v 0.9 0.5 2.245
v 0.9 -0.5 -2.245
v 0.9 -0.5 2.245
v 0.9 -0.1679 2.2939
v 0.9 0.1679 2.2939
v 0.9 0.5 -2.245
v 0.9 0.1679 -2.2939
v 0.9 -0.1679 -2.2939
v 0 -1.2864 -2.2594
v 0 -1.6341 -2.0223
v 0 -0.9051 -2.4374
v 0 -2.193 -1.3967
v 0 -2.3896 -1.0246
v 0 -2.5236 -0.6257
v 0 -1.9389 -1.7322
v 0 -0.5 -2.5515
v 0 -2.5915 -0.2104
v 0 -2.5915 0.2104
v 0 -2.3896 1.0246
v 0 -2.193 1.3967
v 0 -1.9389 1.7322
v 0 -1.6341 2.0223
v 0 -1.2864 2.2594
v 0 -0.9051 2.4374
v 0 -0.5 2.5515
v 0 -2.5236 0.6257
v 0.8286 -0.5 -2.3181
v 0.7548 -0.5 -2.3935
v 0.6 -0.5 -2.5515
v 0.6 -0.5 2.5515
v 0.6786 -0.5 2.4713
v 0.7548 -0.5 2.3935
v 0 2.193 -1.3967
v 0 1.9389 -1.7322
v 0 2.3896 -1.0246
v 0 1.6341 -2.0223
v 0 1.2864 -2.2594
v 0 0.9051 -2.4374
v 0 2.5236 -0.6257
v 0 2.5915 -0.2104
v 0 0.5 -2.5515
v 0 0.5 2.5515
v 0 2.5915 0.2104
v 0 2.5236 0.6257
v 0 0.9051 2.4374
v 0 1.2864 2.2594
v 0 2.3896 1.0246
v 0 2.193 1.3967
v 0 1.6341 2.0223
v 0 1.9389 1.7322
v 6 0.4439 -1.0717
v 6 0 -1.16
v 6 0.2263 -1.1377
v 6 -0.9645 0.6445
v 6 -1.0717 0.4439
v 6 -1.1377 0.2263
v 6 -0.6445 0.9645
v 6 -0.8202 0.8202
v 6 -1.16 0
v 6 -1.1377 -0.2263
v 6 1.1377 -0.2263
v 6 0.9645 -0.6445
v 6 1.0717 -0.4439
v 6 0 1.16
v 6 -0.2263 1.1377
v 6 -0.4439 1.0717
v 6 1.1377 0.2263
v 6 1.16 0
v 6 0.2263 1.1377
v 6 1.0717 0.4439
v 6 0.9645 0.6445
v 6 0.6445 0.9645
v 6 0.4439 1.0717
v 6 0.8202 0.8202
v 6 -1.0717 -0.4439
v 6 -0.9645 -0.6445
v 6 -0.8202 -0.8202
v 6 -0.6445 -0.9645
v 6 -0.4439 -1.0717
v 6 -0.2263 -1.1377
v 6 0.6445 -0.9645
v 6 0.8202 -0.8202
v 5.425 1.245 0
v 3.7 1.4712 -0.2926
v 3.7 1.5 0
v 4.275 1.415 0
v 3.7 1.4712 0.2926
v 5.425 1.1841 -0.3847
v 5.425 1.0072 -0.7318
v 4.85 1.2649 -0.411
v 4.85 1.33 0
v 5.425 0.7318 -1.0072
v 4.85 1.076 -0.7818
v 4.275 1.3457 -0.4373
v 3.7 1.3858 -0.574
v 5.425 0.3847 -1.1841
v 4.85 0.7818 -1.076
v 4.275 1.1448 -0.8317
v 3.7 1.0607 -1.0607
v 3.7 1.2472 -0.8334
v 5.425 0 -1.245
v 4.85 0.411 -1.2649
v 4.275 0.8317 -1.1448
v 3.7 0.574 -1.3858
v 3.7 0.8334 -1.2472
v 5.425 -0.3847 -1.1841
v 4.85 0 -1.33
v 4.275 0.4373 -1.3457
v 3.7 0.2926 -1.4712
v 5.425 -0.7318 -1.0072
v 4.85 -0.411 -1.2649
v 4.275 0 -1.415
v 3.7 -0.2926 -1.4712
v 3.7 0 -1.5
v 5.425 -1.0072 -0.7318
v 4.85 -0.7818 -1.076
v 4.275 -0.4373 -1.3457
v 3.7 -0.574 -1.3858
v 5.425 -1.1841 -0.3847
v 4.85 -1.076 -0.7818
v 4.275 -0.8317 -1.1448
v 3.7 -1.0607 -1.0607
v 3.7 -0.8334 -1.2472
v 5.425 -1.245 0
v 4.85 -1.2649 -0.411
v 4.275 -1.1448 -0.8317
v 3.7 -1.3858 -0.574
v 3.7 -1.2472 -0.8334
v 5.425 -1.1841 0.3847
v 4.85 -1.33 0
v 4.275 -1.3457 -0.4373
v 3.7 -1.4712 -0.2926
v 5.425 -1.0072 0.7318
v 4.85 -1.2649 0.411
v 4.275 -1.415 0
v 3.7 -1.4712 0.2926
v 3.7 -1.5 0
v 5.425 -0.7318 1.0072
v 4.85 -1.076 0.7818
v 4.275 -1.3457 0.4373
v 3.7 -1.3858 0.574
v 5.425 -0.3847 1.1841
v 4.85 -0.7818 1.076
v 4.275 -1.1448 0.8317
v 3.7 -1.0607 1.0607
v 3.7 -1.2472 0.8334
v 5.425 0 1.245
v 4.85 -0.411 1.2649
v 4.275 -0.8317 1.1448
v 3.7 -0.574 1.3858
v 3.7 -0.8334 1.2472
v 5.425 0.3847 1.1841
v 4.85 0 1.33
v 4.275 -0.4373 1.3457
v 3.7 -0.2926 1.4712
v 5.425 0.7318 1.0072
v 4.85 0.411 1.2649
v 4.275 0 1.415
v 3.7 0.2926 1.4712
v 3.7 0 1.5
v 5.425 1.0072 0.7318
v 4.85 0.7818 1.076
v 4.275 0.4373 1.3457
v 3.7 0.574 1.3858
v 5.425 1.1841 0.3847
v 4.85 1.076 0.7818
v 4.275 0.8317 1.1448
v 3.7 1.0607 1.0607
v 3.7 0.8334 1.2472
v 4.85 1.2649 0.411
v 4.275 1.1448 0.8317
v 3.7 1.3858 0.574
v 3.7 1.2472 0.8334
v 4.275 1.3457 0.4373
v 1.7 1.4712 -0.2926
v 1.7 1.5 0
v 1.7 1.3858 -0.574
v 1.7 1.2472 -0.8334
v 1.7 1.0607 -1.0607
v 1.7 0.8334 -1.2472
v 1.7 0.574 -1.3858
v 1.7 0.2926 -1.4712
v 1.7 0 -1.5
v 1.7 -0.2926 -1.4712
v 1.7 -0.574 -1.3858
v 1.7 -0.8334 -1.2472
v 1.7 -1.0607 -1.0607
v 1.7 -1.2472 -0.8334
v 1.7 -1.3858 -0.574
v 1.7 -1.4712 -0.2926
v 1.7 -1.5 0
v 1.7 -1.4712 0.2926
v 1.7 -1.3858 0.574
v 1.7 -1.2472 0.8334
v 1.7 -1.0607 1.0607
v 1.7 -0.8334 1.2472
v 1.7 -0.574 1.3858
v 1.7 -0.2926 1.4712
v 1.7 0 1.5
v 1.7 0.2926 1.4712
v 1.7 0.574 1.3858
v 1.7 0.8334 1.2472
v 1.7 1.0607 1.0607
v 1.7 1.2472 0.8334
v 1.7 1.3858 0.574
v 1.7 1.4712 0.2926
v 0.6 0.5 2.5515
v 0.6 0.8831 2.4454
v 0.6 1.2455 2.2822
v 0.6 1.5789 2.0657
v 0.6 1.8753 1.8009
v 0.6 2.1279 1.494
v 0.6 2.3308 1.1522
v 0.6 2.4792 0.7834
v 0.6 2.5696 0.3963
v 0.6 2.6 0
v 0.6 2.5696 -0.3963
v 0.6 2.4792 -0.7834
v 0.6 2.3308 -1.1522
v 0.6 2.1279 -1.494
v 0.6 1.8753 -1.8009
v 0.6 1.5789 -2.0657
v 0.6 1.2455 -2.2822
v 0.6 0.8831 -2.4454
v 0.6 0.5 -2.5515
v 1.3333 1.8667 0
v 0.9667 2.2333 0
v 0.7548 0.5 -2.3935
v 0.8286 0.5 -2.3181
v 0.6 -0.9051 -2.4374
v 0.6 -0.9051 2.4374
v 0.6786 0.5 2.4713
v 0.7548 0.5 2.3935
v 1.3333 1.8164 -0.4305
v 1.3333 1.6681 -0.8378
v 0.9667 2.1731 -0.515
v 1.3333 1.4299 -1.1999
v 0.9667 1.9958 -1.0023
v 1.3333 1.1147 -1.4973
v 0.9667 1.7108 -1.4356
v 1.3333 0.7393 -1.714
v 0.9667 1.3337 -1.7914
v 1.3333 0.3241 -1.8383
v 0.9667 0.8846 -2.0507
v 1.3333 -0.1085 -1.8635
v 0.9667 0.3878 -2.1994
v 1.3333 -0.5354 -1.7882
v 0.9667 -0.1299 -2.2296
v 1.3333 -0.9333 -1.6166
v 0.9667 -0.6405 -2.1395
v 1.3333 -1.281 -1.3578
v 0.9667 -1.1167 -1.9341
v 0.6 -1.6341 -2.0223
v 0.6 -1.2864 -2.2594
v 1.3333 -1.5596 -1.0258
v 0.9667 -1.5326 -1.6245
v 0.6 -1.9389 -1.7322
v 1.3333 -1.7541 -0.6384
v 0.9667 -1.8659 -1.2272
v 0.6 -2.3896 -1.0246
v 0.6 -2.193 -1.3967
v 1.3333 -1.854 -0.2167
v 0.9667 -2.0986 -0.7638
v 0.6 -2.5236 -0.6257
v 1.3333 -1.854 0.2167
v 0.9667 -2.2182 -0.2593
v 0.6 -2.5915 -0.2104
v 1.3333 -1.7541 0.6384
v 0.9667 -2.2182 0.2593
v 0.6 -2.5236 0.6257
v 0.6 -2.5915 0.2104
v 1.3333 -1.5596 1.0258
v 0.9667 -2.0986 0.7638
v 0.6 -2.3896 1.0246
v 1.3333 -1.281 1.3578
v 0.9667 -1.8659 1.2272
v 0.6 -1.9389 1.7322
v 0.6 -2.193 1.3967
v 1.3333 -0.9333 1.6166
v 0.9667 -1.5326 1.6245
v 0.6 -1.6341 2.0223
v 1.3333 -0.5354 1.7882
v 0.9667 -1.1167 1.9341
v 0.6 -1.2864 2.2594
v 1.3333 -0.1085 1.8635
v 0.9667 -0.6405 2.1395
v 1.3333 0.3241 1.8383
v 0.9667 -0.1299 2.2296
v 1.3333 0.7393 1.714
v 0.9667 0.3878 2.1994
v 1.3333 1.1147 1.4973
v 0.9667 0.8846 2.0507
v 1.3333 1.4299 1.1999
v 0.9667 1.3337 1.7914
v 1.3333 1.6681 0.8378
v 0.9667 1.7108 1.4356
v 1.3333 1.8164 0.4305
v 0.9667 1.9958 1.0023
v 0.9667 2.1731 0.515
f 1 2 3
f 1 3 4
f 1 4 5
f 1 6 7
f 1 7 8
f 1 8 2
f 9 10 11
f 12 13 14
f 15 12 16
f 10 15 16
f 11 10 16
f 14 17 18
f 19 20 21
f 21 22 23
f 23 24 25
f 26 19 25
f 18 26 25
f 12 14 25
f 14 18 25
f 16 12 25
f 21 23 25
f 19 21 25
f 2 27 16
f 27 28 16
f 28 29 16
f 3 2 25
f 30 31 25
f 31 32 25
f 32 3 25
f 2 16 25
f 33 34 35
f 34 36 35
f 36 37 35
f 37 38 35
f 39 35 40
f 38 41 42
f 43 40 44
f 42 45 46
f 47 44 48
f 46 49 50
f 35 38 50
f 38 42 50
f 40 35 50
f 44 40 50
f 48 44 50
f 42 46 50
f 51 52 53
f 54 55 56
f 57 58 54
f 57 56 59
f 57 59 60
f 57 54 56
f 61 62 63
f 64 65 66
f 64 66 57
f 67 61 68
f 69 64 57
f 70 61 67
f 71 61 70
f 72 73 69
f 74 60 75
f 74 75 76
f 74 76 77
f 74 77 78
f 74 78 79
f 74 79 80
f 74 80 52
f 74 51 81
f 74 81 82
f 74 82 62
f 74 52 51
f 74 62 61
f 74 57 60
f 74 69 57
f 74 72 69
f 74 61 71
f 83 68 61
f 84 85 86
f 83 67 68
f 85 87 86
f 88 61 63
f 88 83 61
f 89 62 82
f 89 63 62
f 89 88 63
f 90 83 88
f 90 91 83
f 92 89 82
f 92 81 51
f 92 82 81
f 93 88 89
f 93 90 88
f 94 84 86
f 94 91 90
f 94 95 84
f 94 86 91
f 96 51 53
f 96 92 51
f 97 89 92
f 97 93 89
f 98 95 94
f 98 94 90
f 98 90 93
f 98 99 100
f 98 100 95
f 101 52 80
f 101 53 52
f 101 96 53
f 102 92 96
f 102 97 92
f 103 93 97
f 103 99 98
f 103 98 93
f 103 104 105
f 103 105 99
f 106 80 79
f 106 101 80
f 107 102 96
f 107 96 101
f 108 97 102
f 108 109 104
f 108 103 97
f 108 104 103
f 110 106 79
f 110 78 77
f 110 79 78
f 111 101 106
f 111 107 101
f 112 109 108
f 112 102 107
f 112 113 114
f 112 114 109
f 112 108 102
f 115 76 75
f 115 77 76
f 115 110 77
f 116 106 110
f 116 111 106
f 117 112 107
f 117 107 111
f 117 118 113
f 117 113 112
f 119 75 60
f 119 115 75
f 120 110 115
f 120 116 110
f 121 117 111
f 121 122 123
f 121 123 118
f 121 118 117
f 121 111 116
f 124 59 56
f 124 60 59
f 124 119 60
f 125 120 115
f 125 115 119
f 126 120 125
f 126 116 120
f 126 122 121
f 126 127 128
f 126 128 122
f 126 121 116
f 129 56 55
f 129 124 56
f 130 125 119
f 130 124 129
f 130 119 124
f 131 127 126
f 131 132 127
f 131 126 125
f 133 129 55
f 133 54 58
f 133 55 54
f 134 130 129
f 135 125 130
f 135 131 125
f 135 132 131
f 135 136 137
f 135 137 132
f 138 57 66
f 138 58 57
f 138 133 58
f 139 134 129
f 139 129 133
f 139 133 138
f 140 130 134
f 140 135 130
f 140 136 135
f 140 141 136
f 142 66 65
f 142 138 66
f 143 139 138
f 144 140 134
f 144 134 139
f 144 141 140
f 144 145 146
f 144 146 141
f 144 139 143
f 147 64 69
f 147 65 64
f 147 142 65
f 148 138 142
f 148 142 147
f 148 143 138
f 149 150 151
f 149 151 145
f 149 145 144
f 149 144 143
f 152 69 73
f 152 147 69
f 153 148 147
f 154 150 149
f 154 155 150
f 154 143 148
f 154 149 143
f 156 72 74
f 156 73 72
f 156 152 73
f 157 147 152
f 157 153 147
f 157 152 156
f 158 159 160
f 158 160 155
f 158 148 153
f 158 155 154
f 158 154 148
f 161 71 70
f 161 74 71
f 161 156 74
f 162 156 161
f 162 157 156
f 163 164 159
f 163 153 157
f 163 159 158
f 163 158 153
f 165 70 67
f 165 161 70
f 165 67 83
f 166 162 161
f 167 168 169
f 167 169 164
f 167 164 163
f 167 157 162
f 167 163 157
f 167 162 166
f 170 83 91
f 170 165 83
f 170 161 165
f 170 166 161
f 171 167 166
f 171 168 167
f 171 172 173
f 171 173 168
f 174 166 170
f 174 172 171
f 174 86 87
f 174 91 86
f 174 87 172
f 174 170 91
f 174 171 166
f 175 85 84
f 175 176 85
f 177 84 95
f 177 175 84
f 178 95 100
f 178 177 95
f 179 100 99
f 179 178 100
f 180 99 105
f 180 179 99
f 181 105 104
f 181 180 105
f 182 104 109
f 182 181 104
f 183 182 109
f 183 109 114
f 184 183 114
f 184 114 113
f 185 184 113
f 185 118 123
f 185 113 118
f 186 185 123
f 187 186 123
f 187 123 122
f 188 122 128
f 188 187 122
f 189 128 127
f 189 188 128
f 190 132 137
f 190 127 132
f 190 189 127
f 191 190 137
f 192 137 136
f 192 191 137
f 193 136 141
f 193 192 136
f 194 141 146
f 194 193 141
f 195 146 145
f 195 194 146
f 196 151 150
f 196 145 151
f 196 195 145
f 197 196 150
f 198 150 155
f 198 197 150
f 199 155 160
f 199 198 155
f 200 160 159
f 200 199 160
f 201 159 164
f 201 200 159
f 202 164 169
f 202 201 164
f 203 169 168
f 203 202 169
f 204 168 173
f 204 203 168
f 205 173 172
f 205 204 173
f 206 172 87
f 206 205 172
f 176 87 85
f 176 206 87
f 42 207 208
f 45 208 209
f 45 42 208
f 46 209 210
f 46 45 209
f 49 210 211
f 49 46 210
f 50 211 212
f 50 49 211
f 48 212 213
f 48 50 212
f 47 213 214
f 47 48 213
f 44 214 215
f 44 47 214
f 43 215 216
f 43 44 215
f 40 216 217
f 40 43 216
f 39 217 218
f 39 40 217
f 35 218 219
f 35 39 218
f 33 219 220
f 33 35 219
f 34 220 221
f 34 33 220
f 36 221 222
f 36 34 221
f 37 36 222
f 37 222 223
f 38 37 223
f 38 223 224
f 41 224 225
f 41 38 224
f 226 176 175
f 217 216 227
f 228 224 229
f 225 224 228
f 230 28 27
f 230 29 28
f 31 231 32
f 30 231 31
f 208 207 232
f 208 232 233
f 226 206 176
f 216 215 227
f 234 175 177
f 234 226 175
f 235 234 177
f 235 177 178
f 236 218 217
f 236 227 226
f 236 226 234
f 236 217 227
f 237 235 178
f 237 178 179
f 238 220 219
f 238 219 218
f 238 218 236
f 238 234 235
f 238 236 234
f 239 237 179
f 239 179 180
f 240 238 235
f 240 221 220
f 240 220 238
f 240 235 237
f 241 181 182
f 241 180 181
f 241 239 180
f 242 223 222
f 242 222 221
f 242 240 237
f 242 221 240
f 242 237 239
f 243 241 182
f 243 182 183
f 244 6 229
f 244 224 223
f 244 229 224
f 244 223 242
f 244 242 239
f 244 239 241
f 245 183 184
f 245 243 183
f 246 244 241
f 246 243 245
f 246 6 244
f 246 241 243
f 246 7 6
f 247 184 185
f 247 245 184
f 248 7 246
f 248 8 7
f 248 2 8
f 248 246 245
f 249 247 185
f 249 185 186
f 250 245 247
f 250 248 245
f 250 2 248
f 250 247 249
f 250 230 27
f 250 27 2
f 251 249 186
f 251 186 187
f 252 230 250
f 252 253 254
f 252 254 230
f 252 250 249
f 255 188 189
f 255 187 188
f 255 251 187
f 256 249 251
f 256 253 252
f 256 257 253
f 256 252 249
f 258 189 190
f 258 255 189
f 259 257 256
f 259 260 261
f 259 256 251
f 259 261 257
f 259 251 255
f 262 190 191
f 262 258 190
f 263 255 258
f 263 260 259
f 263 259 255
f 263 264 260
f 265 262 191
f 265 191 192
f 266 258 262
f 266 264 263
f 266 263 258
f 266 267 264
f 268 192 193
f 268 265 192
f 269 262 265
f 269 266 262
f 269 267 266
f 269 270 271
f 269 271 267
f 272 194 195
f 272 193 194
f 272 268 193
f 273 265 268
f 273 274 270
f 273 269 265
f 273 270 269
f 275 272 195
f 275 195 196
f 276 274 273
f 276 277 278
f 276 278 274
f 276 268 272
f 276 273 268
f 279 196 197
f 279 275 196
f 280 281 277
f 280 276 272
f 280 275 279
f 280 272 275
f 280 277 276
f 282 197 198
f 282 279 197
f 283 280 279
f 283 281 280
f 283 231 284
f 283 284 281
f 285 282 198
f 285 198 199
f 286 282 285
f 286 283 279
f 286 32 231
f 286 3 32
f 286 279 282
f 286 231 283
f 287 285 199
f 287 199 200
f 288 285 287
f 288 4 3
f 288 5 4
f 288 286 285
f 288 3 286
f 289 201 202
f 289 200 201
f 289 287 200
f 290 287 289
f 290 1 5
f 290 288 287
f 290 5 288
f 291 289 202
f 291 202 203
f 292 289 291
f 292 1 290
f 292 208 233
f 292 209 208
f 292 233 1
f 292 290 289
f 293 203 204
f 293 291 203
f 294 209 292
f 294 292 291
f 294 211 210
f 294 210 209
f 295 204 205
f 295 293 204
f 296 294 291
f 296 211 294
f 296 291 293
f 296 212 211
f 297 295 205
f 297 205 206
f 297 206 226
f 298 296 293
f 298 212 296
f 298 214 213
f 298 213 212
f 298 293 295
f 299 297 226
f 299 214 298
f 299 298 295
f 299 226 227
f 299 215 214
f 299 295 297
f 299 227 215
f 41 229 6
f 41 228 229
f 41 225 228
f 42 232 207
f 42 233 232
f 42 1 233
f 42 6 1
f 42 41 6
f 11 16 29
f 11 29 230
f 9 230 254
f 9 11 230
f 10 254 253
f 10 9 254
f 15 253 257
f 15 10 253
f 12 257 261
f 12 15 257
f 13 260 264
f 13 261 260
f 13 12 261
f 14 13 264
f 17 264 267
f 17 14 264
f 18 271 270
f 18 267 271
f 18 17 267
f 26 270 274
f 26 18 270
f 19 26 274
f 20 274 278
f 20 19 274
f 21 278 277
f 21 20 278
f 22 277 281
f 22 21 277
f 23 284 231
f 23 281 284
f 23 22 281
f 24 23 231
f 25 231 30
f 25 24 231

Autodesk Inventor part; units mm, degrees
ref_plane "YZ Plane" through (0, 0, 0) normal (1, 0, 0) x (0, 1, 0)
ref_plane "XZ Plane" through (0, 0, 0) normal (0, 1, 0) x (-1, 0, 0)
sketch "Sketch1" plane through (0, 0, 0) normal (0, 0, 1) x (1, 0, 0)
  line L0 (-1.2, 0) -> (7.2, 0) projected
  line L1 (0, 0) -> (6, 0)
  line L2 (6, 0) -> (6, 1.5)
  line L3 (6, 1.5) -> (1.7, 1.5)
  line L4 (1.7, 1.5) -> (1.7, 1.5)
  line L5 (1.7, 1.5) -> (0.6, 2.6)
  line L6 (0.6, 2.6) -> (0, 2.6)
  line L7 (0, 2.6) -> (0, 0)
  line L8 (0, -0.52) -> (0, 3.12) projected
  dimension "d0" = 6
  dimension "d1" = 1.7
  dimension "d2" = 3
  dimension "d3" = 3
  dimension "d4" = 5.2
  dimension "d5" = 45
revolve "Body" add sketch "Sketch1" angle 360 about axis through (0, 0, 0) along (1, 0, 0)
sketch "Sketch2" plane through (0, 0, 0) normal (-1, 0, 0) x (0, 0, 1)
  circle A0 centre (0, 0) radius 2.6 projected
  line L0 (-3.64, 0) -> (3.64, 0) projected
  line L1 (-2.6, 0) -> (-2.6, 0.5)
  line L2 (-2.6, 0.5) -> (2.6, 0.5)
  line L3 (2.6, 0) -> (2.6, 0.5)
  line L4 (-2.6, 0) -> (-2.6, -0.5)
  line L5 (-2.6, -0.5) -> (2.6, -0.5)
  line L6 (2.6, 0) -> (2.6, -0.5)
  dimension "d8" = 1
extrude "Slot" cut sketch "Sketch2" against normal blind 0.9 contours L0 A0 L2 | L6 L5 A0 | A0 L5 L0 | A0 L2 L3 | L1 L2 A0 | A0 L5 L4
thread "Thread" size "M3x0.5" class "6g" standard "ISO Metric profile" length 4.3
chamfer "Chamfer1" distance 0.34 distance2 2.3 1 edges at (6, -1.5, 0) measured on face at (6, -0.8773, -0.3972)
ref_plane "Work Plane1" through (2.2553, 0, 0) normal (0, 0, -1) x (1, 0, 0)
equation "\"d8\" = SBR"
equation "\"d9\" = STI"
equation "\"d0\" = NLG"
equation "\"d1\" = KOH"
equation "\"d2\" = NND"
equation "\"d3\" = SED2"
equation "\"d4\" = KOD"
equation "\"d5\" = 0.5 * SEWI"
equation "\"d6\" = GEL"
equation "\"d14\" = -0.5 * GD2 + 0.5 * NND"
equation "\"d15\" = SPTZ"
equation "\"NND\" = 3"
equation "\"NLG\" = 6"
equation "\"GEL\" = 4.3"
equation "\"KOH\" = 1.7"
equation "\"KOD\" = 5.2"
equation "\"SBR\" = 1"
equation "\"STI\" = 0.9"
equation "\"GD2\" = 2.32"
equation "\"SED2\" = 3"
equation "\"SEWI\" = 90deg"
equation "\"SPTZ\" = 2.3"
equation "\"GUL\" = 0.61345 * PTC"
equation "\"THREADDIA\" = 3"
equation "\"TOA\" = 30deg"
equation "\"PTC\" = 0.5"
equation "\"GAL\" = 0.61345 * PTC"
equation "\"GD1\" = THREADDIA - 1.2269 * PTC"
properties part number "ANSI/ASME B18.6.5M - M3x0.5 x 6, SFCHTSTTM" material "Steel, Mild"
